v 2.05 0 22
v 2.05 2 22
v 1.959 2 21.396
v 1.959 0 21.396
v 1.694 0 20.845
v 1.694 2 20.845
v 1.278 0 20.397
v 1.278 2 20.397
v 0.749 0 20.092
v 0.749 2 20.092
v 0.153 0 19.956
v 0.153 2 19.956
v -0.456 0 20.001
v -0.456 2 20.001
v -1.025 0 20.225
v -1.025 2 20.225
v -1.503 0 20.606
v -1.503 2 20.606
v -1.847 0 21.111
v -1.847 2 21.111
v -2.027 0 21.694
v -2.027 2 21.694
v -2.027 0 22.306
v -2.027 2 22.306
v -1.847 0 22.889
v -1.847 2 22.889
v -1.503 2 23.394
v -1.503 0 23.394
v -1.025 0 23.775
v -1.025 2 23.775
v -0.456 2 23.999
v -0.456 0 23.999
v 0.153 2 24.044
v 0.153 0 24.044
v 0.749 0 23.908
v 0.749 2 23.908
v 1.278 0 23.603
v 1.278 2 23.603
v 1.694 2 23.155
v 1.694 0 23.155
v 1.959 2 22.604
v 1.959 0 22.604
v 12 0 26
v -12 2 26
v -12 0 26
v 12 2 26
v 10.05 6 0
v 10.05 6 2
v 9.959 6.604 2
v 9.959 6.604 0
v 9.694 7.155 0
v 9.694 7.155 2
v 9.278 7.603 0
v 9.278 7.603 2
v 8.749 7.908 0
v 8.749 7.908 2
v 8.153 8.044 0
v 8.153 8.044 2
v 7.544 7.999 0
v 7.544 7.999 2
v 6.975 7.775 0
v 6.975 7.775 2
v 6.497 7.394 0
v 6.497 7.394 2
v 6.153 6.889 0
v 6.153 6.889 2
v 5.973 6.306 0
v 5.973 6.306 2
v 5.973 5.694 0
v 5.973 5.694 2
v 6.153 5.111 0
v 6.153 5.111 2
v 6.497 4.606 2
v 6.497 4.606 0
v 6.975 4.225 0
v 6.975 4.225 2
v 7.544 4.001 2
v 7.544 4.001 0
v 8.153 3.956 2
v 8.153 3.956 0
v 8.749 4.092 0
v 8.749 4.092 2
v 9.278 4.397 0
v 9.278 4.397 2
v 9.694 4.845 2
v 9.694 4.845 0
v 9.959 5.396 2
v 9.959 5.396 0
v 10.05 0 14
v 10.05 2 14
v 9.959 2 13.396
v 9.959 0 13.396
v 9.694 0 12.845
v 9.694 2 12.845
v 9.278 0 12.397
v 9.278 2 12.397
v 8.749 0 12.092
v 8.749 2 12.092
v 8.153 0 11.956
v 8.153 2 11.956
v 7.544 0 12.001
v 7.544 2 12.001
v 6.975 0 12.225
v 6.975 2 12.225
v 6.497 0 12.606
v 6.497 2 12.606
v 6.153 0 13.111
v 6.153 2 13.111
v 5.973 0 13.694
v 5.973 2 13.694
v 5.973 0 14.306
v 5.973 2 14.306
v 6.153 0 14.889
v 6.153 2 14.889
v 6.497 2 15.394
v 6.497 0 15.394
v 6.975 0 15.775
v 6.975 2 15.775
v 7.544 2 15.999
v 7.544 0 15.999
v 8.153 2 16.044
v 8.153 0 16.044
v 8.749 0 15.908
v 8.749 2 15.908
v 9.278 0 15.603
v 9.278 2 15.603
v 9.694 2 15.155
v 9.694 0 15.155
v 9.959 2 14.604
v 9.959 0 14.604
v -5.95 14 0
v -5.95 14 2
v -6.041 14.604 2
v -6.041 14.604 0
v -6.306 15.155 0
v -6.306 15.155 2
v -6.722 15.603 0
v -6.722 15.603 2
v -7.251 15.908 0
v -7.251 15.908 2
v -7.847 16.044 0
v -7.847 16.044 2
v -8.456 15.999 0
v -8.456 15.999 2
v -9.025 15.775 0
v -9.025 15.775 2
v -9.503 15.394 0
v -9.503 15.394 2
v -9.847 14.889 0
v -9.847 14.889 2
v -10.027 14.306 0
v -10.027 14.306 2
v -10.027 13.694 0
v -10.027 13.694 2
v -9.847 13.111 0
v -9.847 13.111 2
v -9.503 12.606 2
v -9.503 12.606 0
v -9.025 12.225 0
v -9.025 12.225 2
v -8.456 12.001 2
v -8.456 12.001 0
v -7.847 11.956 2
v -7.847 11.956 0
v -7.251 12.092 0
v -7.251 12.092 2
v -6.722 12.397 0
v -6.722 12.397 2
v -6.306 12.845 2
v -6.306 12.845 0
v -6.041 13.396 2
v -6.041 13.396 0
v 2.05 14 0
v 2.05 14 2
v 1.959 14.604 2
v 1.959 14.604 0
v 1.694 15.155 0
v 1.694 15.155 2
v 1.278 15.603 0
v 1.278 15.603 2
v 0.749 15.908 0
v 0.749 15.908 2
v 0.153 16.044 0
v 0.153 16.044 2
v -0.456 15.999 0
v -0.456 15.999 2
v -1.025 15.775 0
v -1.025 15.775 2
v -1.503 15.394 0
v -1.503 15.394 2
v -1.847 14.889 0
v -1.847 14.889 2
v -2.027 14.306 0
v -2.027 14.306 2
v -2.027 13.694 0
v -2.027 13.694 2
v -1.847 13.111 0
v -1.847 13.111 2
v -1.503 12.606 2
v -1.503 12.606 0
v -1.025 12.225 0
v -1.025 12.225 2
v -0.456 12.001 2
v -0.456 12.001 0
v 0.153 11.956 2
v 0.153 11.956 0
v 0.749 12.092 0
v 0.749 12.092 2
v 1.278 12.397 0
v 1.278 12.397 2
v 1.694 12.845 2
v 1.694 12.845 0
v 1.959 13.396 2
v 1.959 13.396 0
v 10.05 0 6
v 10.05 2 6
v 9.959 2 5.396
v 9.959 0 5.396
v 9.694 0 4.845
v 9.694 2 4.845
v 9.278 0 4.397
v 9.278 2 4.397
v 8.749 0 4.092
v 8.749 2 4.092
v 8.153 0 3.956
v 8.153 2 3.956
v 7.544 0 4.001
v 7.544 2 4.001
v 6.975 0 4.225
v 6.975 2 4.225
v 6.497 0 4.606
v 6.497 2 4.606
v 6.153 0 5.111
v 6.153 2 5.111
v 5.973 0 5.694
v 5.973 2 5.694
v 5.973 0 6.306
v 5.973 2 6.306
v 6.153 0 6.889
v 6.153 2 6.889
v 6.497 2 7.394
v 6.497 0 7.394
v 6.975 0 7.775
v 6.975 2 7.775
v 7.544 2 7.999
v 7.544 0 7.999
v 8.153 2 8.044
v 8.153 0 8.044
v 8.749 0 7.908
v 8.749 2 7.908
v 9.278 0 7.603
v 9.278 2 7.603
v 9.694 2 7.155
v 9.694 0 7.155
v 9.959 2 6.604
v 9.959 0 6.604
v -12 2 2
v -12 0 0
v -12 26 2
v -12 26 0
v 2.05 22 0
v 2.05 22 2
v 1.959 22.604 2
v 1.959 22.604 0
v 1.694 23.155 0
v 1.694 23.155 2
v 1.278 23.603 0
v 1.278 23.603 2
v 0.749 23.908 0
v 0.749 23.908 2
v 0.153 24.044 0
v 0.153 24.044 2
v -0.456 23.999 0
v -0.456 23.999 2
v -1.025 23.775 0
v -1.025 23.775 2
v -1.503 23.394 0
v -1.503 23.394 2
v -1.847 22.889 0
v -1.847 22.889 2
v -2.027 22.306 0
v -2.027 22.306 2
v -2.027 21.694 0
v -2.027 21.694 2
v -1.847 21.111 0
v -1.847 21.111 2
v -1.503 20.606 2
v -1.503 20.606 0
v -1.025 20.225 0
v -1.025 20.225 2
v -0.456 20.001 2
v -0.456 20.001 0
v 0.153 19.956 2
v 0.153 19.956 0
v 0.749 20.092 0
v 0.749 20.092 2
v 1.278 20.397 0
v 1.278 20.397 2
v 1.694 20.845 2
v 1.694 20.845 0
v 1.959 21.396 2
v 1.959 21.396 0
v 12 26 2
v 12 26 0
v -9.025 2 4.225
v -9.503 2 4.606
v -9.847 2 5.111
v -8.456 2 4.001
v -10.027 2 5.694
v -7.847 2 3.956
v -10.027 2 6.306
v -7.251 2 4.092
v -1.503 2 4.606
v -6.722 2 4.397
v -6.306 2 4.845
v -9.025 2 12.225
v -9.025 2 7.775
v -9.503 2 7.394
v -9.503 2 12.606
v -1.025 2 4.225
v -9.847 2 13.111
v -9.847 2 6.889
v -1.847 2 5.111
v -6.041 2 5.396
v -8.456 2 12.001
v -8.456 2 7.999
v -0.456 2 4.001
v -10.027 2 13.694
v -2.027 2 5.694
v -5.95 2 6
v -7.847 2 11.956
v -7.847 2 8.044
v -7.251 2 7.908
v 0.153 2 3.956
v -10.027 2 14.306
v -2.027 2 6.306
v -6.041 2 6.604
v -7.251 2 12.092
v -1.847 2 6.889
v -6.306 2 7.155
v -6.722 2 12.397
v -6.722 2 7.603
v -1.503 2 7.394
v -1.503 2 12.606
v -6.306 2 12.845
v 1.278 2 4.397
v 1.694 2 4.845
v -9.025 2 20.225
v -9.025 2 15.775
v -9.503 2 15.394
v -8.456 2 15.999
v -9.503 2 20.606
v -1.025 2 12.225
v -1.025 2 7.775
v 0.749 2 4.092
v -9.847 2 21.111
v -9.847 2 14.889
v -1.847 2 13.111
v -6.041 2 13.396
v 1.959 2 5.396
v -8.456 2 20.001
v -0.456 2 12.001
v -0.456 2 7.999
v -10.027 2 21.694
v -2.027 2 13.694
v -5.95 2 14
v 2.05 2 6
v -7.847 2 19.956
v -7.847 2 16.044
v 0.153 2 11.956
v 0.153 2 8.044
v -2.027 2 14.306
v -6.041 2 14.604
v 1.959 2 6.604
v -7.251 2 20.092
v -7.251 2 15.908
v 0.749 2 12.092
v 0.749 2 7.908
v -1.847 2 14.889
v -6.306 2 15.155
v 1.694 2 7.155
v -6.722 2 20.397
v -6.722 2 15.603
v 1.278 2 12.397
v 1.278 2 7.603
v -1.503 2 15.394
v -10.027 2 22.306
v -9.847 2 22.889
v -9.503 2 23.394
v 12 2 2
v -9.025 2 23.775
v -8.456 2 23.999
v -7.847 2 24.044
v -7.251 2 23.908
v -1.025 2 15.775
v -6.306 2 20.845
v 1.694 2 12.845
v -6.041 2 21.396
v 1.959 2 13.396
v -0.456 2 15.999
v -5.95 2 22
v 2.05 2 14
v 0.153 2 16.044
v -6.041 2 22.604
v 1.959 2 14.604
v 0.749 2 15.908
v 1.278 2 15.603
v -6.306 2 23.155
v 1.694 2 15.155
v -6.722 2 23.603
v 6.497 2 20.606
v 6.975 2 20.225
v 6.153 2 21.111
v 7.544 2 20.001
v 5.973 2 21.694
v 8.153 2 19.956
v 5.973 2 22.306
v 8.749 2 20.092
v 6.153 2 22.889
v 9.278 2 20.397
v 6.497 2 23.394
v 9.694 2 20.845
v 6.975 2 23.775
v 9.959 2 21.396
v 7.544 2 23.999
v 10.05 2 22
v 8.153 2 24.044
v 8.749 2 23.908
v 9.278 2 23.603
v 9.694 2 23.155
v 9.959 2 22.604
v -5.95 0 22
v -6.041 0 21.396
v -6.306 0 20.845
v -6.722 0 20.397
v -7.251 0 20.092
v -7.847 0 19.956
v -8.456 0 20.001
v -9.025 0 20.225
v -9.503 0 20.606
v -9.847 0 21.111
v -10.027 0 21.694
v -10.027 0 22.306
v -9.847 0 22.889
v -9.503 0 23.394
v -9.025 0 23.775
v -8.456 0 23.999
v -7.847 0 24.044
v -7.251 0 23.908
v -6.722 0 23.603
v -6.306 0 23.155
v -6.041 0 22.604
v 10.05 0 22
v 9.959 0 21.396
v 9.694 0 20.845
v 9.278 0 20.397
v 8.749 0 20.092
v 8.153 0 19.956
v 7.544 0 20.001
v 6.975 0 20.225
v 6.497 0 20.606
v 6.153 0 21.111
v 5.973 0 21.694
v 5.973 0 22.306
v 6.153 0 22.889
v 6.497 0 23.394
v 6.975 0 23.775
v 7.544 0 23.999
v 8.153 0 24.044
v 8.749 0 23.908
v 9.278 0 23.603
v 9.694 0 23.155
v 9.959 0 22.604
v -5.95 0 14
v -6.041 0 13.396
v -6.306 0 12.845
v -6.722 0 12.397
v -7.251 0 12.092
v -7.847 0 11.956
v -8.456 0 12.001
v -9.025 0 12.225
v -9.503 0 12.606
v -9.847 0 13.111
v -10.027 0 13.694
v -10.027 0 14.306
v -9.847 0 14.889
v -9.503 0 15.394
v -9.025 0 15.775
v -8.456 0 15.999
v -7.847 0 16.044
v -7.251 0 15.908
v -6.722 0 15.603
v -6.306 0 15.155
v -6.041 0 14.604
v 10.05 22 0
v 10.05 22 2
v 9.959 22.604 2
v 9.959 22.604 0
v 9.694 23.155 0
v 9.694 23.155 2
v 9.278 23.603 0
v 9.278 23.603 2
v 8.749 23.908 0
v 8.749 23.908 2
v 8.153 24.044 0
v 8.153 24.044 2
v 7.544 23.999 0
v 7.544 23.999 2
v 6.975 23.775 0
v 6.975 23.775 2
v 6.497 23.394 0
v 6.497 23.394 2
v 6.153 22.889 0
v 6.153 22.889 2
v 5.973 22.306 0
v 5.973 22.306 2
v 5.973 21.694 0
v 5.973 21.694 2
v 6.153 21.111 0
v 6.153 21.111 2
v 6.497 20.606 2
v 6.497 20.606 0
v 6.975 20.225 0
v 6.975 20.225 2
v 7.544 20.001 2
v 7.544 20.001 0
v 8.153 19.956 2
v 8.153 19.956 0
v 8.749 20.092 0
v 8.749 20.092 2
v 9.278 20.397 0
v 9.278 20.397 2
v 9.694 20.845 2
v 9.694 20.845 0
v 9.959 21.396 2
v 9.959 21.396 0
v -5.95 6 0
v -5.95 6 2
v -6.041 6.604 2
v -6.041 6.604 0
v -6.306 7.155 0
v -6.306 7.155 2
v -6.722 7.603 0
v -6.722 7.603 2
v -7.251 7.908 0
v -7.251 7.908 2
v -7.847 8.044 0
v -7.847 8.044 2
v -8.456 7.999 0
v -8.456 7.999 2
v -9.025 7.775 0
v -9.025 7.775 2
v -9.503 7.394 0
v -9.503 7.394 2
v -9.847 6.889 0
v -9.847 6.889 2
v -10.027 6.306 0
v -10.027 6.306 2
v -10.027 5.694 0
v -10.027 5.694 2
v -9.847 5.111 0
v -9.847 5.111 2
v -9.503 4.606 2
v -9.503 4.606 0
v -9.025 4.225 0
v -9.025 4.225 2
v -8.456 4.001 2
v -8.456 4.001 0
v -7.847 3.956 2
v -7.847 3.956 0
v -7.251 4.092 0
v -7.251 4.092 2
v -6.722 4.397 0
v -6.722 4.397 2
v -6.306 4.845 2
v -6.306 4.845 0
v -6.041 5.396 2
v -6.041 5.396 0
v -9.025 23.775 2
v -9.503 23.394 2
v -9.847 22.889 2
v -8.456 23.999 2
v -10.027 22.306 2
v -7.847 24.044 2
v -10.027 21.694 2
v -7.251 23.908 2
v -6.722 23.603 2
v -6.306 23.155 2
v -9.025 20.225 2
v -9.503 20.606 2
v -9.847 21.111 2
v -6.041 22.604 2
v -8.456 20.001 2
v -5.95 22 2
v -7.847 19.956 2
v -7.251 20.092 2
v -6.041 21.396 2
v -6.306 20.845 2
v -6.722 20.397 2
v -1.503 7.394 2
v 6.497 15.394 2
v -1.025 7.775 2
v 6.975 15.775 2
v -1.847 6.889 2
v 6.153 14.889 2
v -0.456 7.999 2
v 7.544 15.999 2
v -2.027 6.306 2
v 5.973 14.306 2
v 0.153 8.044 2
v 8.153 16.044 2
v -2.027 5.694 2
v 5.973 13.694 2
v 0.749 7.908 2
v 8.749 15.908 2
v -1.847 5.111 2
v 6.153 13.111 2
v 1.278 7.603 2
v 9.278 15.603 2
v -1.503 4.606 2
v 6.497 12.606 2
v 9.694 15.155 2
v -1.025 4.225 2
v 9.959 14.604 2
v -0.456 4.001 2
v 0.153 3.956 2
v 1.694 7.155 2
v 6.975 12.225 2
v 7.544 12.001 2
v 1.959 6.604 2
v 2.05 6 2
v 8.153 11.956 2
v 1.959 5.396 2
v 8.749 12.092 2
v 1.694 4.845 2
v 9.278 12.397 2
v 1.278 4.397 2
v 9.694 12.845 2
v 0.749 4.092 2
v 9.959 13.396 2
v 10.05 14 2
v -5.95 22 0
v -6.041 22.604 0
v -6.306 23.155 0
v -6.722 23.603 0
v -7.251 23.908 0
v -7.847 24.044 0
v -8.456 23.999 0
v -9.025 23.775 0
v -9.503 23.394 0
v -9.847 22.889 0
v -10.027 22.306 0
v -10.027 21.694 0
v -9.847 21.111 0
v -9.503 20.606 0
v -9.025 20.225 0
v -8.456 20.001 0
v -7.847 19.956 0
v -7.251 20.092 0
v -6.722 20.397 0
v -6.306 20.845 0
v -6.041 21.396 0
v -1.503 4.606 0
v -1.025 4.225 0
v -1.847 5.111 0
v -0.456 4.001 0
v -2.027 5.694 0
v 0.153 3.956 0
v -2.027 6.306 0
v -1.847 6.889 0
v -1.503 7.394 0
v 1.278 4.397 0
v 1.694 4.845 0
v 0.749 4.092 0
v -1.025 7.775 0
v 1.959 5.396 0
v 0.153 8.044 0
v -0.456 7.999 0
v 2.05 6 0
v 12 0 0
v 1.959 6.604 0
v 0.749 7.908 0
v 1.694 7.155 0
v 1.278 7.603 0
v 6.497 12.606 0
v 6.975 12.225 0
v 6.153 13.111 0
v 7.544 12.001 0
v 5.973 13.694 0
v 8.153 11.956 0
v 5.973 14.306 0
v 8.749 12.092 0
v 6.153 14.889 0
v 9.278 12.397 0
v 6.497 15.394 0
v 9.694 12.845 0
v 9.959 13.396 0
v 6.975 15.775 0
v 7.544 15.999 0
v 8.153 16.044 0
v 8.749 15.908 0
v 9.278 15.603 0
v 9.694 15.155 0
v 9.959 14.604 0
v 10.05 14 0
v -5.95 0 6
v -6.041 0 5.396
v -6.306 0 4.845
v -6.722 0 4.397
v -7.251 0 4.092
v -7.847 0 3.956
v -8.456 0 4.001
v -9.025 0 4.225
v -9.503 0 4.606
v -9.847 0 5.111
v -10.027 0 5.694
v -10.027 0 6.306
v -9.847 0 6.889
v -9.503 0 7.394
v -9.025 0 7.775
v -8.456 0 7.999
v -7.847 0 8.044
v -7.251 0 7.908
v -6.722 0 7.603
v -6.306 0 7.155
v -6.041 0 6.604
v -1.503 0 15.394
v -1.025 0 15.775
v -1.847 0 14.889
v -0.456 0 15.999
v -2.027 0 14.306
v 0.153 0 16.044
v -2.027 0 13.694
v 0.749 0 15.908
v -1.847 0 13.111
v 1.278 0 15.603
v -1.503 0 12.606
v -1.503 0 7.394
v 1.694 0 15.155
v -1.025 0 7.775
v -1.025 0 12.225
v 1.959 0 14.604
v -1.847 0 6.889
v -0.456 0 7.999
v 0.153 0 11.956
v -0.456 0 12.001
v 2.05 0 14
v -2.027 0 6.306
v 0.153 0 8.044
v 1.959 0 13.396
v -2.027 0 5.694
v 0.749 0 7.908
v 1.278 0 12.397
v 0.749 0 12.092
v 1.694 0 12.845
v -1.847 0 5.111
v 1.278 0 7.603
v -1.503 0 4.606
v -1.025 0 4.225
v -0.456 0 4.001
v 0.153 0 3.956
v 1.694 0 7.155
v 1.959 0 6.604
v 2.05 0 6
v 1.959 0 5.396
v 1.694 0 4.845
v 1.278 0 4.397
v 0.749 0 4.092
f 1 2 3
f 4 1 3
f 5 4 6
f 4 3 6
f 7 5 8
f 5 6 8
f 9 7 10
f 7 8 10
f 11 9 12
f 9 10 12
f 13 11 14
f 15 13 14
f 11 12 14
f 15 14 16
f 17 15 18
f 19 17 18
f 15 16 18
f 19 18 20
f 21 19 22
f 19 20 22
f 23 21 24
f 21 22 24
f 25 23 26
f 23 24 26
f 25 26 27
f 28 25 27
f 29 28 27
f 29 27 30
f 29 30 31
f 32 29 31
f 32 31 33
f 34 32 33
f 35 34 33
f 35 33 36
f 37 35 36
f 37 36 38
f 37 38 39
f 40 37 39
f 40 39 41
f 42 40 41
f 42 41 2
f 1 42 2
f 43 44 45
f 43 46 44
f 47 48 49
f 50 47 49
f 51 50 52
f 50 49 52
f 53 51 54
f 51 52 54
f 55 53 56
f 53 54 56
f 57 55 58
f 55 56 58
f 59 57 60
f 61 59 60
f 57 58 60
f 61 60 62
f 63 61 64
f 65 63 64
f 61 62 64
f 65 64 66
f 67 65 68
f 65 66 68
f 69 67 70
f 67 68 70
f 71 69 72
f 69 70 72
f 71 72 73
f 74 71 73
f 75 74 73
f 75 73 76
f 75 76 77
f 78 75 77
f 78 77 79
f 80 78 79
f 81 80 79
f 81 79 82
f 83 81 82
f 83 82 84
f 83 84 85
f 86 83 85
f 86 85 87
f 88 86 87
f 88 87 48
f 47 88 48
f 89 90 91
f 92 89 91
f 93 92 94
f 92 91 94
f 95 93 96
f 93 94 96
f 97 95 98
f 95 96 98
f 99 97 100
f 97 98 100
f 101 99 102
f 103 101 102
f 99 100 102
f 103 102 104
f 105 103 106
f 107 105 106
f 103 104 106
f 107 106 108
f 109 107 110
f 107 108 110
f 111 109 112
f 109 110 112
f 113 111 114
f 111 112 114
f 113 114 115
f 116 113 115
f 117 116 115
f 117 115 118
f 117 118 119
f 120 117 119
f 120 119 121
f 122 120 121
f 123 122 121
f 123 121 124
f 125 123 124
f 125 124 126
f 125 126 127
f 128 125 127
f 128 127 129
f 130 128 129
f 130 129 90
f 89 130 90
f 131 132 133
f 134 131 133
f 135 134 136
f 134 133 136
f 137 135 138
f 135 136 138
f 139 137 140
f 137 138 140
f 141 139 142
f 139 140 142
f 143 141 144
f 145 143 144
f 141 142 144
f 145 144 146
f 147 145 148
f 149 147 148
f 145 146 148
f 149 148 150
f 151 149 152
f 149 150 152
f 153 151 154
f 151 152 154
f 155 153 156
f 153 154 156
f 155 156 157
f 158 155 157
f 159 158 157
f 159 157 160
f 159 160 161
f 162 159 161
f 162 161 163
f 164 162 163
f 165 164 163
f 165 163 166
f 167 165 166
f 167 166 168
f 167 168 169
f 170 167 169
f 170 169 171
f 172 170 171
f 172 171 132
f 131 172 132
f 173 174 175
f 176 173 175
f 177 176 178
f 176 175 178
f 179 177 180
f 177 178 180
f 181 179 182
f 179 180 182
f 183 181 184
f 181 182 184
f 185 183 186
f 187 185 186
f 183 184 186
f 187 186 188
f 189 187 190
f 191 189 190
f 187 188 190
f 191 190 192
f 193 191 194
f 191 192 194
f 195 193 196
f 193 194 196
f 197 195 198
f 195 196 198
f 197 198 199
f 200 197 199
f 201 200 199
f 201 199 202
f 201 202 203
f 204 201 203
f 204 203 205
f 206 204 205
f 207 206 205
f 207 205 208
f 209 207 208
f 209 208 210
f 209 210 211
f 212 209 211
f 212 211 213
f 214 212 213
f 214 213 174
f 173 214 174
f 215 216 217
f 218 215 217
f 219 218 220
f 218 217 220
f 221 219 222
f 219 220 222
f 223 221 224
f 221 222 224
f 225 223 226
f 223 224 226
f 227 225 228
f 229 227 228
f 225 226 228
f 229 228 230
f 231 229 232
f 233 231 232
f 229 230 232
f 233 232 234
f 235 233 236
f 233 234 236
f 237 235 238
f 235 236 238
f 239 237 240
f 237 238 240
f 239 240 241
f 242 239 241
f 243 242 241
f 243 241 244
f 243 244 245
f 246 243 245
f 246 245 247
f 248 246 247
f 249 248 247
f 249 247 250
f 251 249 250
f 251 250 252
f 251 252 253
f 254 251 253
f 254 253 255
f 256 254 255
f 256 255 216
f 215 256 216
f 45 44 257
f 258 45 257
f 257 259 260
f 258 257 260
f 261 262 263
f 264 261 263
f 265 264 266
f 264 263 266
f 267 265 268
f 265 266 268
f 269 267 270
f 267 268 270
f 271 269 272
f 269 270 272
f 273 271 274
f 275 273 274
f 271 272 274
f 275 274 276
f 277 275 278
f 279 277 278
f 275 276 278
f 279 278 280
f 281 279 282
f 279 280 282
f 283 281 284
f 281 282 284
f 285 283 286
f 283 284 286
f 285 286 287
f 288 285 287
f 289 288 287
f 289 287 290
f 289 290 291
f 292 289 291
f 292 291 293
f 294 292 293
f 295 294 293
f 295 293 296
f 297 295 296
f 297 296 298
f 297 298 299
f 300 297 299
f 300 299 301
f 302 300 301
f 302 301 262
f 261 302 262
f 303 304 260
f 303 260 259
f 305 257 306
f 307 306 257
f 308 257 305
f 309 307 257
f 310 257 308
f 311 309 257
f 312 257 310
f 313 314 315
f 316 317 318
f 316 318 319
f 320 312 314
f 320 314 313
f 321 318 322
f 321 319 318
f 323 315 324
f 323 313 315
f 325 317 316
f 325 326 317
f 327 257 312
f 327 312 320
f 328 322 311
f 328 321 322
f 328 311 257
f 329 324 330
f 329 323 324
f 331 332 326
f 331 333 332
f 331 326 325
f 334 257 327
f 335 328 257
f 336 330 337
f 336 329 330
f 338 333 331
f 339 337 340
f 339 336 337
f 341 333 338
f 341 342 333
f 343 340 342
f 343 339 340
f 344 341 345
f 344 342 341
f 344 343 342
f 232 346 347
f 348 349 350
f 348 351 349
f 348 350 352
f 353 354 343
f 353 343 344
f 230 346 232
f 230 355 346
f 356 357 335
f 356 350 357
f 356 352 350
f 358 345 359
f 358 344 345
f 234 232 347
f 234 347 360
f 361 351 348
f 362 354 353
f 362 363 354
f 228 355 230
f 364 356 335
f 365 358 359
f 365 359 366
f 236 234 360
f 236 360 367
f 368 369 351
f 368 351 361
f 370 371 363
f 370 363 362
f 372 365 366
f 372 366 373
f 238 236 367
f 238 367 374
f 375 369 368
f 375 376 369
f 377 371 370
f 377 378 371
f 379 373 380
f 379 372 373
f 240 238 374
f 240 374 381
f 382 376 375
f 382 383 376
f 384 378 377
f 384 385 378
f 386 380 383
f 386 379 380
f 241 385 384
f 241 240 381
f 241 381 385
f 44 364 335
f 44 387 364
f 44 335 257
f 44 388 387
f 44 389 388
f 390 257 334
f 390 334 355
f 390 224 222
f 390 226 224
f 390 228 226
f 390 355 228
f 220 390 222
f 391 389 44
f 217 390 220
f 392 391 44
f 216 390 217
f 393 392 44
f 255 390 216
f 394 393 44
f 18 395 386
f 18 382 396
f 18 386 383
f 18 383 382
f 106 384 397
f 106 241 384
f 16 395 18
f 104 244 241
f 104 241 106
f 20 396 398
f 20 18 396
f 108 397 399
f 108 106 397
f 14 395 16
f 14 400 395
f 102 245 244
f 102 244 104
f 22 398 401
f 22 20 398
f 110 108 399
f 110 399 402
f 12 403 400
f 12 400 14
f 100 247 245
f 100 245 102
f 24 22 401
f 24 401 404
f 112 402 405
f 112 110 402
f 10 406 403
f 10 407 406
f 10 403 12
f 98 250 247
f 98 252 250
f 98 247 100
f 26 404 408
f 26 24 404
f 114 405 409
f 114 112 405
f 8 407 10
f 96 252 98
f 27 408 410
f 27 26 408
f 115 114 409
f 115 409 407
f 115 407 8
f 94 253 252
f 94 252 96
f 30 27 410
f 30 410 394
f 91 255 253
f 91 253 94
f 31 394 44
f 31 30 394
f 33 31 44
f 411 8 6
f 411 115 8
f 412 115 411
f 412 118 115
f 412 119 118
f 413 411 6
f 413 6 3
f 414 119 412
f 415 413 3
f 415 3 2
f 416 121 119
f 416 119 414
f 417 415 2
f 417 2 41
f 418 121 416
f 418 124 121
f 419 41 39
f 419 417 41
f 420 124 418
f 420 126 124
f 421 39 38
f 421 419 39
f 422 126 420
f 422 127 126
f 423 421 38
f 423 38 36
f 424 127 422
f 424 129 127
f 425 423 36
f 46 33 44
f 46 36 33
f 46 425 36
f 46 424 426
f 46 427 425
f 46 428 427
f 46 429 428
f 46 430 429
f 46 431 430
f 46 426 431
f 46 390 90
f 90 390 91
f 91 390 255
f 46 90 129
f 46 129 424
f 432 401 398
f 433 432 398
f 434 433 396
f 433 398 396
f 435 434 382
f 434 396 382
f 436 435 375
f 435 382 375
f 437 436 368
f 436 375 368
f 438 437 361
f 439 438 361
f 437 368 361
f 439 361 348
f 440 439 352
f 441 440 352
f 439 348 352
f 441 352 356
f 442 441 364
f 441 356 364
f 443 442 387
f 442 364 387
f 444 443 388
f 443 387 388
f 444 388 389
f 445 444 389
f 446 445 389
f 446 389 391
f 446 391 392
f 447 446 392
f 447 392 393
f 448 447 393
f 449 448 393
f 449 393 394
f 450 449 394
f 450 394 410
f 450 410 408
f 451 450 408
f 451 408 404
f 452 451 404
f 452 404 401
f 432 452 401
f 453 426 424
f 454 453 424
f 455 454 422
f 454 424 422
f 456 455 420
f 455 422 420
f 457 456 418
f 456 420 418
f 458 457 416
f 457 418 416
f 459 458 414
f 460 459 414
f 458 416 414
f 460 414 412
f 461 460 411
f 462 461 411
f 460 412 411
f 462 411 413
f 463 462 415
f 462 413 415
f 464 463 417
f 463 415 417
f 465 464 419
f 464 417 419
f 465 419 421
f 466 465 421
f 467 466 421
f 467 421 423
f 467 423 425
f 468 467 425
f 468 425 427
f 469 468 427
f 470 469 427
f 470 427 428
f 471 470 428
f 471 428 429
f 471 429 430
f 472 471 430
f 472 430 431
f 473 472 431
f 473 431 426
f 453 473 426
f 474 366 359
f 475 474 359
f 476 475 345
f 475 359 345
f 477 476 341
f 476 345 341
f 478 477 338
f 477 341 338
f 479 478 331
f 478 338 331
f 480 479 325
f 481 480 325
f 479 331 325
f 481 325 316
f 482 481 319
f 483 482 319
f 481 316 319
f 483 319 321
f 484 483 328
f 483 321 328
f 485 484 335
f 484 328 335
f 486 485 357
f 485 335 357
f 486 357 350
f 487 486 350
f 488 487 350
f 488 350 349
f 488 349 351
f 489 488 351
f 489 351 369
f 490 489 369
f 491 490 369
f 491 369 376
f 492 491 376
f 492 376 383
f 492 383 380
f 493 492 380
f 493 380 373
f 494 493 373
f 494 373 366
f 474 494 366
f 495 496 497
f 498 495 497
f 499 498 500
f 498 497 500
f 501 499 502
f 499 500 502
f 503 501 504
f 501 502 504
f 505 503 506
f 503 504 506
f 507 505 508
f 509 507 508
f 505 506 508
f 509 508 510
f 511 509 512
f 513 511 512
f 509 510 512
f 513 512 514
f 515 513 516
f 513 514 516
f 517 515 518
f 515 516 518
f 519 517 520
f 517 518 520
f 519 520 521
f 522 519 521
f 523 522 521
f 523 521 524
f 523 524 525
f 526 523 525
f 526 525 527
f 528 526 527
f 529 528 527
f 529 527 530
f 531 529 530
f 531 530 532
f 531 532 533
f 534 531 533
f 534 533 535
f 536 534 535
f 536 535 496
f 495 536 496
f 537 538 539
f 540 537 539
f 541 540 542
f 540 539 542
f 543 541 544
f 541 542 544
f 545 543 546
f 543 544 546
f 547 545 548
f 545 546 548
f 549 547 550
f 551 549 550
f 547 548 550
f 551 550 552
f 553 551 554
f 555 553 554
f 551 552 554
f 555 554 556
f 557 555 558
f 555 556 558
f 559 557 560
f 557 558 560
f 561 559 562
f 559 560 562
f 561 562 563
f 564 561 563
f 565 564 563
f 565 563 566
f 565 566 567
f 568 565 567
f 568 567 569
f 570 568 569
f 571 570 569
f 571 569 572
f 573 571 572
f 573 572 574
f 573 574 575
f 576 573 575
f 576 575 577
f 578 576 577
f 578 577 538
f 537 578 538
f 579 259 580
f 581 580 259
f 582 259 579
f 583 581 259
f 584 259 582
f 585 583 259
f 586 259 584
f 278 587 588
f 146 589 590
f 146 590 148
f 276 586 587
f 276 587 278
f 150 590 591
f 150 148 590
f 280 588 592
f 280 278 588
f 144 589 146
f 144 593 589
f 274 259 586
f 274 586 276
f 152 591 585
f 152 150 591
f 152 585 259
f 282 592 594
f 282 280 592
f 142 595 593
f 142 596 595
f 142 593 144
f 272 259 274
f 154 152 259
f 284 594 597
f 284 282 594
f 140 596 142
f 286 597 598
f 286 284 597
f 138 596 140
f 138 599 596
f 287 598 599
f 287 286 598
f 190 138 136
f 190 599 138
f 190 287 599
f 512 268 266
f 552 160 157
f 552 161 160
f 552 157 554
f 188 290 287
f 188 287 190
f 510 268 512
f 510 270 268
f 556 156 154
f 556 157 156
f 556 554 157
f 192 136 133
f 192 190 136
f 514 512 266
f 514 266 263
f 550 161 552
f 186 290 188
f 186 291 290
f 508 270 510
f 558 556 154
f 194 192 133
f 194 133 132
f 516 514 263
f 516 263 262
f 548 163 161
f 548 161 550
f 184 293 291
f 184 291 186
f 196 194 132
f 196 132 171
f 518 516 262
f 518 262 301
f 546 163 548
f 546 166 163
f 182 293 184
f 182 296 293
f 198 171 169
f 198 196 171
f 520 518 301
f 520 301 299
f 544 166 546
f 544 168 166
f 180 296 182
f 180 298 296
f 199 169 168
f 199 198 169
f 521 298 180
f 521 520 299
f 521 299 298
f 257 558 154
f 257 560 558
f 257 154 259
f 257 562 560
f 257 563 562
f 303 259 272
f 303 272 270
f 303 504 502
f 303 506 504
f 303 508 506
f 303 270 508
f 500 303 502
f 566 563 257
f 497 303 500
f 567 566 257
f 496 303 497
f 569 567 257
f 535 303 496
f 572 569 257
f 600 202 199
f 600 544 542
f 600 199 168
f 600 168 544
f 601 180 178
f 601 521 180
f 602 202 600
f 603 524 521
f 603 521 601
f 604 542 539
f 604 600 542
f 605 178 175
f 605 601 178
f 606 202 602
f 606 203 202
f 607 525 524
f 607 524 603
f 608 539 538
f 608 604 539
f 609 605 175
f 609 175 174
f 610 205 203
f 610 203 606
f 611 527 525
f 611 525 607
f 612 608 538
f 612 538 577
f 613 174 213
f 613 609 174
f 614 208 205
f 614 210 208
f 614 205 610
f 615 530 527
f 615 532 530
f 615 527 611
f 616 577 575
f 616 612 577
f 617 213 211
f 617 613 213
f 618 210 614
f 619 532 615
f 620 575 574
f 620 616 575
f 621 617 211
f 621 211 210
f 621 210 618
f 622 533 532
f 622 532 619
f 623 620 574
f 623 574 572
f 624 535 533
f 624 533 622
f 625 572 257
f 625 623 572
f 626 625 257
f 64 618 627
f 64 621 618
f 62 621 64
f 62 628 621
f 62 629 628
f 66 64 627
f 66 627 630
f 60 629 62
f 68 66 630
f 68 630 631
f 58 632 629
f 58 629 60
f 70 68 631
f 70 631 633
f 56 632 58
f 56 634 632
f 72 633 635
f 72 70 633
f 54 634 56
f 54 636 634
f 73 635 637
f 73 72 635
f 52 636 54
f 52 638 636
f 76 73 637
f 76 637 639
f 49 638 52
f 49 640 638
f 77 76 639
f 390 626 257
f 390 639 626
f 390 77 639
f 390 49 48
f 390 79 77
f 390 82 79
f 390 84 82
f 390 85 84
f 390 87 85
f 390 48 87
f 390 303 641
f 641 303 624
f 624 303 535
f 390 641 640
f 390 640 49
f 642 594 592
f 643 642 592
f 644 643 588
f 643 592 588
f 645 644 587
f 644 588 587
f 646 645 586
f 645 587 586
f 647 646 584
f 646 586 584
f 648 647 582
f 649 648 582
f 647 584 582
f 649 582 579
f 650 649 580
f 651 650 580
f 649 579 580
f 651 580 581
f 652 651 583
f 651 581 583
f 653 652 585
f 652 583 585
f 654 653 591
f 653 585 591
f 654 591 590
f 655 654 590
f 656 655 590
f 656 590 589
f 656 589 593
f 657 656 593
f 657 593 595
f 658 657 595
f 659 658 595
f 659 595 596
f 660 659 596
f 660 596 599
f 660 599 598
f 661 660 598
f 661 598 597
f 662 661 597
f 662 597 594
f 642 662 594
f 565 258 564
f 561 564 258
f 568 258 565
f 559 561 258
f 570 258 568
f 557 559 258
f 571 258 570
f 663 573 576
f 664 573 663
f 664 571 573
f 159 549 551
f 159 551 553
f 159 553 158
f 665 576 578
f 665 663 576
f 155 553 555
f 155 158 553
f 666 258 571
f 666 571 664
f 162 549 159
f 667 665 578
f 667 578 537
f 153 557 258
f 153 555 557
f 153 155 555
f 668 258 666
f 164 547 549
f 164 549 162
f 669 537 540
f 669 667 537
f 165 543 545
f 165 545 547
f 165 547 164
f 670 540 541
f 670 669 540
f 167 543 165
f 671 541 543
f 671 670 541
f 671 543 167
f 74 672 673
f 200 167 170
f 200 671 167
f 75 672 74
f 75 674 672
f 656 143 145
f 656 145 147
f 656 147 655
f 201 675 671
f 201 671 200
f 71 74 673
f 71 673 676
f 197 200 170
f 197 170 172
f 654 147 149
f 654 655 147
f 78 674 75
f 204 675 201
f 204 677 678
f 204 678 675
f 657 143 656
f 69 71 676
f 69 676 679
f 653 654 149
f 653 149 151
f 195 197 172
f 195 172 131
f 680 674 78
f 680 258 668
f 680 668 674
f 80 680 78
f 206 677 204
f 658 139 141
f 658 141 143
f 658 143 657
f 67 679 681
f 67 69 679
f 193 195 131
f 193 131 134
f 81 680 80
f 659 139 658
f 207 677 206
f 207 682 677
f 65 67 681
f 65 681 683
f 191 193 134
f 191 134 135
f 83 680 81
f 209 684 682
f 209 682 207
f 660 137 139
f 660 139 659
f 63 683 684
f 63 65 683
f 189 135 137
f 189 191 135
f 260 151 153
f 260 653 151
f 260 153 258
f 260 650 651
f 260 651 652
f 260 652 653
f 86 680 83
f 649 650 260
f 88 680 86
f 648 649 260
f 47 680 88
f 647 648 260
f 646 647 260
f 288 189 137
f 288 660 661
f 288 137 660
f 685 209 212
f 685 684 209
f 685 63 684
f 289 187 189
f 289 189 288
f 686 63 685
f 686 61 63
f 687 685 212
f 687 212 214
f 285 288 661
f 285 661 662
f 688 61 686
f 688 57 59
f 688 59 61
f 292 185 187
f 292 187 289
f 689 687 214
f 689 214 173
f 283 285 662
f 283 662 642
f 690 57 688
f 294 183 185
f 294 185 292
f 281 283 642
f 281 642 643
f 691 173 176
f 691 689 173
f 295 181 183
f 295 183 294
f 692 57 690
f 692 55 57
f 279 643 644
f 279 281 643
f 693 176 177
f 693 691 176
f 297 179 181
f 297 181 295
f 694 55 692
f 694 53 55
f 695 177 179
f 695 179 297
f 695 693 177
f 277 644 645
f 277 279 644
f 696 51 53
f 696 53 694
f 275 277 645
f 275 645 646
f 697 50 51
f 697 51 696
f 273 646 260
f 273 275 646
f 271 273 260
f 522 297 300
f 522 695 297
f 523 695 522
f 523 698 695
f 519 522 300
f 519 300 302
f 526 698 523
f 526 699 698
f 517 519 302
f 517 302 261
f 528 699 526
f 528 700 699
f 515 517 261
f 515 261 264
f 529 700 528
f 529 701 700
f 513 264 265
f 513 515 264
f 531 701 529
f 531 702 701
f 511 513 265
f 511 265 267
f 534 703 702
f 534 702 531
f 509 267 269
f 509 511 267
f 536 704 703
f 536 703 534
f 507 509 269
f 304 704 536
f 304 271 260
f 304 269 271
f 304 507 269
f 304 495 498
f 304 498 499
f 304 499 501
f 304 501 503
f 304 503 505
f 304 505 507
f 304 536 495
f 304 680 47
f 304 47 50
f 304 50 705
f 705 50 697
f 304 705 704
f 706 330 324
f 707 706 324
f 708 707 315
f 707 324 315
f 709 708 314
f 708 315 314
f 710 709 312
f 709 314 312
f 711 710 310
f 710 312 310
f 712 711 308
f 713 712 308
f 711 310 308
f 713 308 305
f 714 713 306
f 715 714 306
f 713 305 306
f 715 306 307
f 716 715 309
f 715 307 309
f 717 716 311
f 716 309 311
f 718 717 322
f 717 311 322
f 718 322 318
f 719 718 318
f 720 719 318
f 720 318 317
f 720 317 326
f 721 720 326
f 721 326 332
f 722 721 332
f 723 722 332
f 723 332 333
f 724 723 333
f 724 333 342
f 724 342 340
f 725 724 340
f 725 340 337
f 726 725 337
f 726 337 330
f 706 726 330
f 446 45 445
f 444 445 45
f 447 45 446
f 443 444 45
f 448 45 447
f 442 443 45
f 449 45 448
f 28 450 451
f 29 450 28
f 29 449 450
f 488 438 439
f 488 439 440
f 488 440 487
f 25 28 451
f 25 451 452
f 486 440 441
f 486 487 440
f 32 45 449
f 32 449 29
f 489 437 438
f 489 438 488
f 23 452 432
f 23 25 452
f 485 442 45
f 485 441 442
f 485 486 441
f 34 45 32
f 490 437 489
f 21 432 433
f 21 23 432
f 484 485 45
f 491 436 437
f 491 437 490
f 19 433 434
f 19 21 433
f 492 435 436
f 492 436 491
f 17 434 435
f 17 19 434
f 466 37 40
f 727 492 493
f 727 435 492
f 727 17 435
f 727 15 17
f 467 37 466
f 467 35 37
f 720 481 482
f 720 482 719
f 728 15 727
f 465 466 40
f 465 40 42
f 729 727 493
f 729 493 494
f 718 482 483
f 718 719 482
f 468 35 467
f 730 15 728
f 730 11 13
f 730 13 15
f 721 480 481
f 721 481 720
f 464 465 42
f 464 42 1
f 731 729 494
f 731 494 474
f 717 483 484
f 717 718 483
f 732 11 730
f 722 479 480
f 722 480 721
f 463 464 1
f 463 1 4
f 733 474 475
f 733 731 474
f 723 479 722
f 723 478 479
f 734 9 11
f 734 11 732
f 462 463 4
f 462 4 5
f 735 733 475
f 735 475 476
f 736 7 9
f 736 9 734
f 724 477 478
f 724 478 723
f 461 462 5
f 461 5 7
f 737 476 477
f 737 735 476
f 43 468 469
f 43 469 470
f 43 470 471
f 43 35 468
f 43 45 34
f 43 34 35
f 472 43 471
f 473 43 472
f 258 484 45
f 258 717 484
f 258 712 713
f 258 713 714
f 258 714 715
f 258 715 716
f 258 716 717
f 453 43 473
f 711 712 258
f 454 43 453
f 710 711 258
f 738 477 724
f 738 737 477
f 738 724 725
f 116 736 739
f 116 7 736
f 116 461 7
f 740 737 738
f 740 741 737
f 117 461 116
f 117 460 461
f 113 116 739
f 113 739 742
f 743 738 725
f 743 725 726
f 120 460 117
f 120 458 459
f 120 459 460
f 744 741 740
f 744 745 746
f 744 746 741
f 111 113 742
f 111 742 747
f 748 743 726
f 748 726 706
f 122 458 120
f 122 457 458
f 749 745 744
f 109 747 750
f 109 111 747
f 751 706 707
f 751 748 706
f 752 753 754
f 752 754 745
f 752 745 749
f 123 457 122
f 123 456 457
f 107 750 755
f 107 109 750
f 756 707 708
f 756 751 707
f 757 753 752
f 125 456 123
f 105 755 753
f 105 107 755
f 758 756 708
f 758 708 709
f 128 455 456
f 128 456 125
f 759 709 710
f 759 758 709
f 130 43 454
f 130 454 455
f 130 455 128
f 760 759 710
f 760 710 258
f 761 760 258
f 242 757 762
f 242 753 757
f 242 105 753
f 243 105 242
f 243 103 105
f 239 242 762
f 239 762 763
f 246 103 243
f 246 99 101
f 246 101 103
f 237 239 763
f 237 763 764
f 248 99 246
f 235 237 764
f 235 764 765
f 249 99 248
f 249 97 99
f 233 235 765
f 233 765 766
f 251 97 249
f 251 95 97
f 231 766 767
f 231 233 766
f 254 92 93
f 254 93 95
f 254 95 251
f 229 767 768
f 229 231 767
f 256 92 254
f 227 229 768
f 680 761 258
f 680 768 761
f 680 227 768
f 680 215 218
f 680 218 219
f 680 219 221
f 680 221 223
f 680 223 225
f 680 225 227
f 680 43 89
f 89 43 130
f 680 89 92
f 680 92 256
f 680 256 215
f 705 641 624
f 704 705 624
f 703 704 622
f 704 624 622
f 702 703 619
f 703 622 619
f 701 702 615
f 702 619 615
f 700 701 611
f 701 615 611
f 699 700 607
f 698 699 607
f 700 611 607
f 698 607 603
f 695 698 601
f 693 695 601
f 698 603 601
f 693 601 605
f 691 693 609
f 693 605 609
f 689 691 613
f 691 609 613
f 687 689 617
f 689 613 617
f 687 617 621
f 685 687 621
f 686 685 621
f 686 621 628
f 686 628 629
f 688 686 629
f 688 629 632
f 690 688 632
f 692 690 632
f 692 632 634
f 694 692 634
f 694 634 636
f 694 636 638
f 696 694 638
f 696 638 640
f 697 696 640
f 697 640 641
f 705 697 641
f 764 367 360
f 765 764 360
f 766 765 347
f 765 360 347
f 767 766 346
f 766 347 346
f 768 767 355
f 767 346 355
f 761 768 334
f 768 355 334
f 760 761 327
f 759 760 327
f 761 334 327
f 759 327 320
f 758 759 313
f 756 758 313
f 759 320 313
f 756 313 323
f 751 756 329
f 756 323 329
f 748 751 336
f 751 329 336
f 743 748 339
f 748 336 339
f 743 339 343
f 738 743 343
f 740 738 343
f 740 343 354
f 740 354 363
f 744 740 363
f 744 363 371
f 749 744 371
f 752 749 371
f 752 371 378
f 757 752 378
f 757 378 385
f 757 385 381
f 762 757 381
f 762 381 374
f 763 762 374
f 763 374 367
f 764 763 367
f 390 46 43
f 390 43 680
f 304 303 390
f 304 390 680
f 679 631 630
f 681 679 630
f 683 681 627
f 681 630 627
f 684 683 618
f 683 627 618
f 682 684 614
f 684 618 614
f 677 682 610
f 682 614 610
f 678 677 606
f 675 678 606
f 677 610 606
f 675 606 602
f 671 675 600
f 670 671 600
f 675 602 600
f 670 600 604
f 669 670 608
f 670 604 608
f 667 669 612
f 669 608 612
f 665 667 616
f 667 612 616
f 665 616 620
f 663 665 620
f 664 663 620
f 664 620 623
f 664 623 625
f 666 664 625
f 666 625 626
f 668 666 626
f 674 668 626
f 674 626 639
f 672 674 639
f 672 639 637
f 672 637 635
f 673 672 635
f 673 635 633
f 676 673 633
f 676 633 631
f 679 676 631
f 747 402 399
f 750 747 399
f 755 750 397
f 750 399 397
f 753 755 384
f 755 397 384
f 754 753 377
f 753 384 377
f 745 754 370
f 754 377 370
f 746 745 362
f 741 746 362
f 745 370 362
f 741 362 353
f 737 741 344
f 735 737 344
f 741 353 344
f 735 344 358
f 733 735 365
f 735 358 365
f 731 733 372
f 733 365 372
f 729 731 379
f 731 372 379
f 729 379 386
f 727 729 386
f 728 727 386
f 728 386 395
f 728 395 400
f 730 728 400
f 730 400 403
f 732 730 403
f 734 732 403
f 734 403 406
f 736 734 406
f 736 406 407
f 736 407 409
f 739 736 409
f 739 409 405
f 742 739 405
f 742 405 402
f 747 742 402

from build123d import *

# Parameters (mm, degrees)
BOSS_EXTRUDE1_DEPTH     = 12
SKETCH3_R               = 2.05
CUT_EXTRUDE1_DEPTH      = 25
CUT_EXTRUDE1_DEPTH_BACK = 3
SKETCH4_R               = 2.05
CUT_EXTRUDE2_DEPTH      = 3


with BuildPart() as part:
    # Sketch1 → Boss-Extrude1 (new body, symmetric)
    with BuildSketch(Plane(origin=(0, 0, 0), x_dir=(0, 0, -1), z_dir=(1, 0, 0))):
        Polygon((0, 0), (0, 26), (-2, 26), (-2, 2), (-26, 2), (-26, 0), align=None)
    extrude(amount=BOSS_EXTRUDE1_DEPTH, both=True)

    # Sketch3 → Cut-Extrude1 (cut, two sides)
    with BuildSketch(Plane.XY.offset(2)) as cut_extrude1_sk:
        with Locations((-8, 22)):
            Circle(SKETCH3_R)
        with Locations((0, 22)):
            Circle(SKETCH3_R)
        with Locations((8, 22)):
            Circle(SKETCH3_R)
        with Locations((0, 14)):
            Circle(SKETCH3_R)
        with Locations((8, 14)):
            Circle(SKETCH3_R)
        with Locations((0, 6)):
            Circle(SKETCH3_R)
        with Locations((8, 6)):
            Circle(SKETCH3_R)
        with Locations((-8, 14)):
            Circle(SKETCH3_R)
        with Locations((-8, 6)):
            Circle(SKETCH3_R)
    extrude(amount=CUT_EXTRUDE1_DEPTH, mode=Mode.SUBTRACT)
    extrude(cut_extrude1_sk.sketch, amount=-CUT_EXTRUDE1_DEPTH_BACK, mode=Mode.SUBTRACT)

    # Sketch4 → Cut-Extrude2 (cut, through all)
    with BuildSketch(Plane(origin=(0, 2, 0), x_dir=(1, 0, 0), z_dir=(0, 1, 0))):
        with Locations((-8, -22)):
            Circle(SKETCH4_R)
        with Locations((0, -22)):
            Circle(SKETCH4_R)
        with Locations((8, -22)):
            Circle(SKETCH4_R)
        with Locations((0, -14)):
            Circle(SKETCH4_R)
        with Locations((8, -14)):
            Circle(SKETCH4_R)
        with Locations((0, -6)):
            Circle(SKETCH4_R)
        with Locations((8, -6)):
            Circle(SKETCH4_R)
        with Locations((-8, -14)):
            Circle(SKETCH4_R)
        with Locations((-8, -6)):
            Circle(SKETCH4_R)
    extrude(amount=-CUT_EXTRUDE2_DEPTH, mode=Mode.SUBTRACT)


solid = part.part
